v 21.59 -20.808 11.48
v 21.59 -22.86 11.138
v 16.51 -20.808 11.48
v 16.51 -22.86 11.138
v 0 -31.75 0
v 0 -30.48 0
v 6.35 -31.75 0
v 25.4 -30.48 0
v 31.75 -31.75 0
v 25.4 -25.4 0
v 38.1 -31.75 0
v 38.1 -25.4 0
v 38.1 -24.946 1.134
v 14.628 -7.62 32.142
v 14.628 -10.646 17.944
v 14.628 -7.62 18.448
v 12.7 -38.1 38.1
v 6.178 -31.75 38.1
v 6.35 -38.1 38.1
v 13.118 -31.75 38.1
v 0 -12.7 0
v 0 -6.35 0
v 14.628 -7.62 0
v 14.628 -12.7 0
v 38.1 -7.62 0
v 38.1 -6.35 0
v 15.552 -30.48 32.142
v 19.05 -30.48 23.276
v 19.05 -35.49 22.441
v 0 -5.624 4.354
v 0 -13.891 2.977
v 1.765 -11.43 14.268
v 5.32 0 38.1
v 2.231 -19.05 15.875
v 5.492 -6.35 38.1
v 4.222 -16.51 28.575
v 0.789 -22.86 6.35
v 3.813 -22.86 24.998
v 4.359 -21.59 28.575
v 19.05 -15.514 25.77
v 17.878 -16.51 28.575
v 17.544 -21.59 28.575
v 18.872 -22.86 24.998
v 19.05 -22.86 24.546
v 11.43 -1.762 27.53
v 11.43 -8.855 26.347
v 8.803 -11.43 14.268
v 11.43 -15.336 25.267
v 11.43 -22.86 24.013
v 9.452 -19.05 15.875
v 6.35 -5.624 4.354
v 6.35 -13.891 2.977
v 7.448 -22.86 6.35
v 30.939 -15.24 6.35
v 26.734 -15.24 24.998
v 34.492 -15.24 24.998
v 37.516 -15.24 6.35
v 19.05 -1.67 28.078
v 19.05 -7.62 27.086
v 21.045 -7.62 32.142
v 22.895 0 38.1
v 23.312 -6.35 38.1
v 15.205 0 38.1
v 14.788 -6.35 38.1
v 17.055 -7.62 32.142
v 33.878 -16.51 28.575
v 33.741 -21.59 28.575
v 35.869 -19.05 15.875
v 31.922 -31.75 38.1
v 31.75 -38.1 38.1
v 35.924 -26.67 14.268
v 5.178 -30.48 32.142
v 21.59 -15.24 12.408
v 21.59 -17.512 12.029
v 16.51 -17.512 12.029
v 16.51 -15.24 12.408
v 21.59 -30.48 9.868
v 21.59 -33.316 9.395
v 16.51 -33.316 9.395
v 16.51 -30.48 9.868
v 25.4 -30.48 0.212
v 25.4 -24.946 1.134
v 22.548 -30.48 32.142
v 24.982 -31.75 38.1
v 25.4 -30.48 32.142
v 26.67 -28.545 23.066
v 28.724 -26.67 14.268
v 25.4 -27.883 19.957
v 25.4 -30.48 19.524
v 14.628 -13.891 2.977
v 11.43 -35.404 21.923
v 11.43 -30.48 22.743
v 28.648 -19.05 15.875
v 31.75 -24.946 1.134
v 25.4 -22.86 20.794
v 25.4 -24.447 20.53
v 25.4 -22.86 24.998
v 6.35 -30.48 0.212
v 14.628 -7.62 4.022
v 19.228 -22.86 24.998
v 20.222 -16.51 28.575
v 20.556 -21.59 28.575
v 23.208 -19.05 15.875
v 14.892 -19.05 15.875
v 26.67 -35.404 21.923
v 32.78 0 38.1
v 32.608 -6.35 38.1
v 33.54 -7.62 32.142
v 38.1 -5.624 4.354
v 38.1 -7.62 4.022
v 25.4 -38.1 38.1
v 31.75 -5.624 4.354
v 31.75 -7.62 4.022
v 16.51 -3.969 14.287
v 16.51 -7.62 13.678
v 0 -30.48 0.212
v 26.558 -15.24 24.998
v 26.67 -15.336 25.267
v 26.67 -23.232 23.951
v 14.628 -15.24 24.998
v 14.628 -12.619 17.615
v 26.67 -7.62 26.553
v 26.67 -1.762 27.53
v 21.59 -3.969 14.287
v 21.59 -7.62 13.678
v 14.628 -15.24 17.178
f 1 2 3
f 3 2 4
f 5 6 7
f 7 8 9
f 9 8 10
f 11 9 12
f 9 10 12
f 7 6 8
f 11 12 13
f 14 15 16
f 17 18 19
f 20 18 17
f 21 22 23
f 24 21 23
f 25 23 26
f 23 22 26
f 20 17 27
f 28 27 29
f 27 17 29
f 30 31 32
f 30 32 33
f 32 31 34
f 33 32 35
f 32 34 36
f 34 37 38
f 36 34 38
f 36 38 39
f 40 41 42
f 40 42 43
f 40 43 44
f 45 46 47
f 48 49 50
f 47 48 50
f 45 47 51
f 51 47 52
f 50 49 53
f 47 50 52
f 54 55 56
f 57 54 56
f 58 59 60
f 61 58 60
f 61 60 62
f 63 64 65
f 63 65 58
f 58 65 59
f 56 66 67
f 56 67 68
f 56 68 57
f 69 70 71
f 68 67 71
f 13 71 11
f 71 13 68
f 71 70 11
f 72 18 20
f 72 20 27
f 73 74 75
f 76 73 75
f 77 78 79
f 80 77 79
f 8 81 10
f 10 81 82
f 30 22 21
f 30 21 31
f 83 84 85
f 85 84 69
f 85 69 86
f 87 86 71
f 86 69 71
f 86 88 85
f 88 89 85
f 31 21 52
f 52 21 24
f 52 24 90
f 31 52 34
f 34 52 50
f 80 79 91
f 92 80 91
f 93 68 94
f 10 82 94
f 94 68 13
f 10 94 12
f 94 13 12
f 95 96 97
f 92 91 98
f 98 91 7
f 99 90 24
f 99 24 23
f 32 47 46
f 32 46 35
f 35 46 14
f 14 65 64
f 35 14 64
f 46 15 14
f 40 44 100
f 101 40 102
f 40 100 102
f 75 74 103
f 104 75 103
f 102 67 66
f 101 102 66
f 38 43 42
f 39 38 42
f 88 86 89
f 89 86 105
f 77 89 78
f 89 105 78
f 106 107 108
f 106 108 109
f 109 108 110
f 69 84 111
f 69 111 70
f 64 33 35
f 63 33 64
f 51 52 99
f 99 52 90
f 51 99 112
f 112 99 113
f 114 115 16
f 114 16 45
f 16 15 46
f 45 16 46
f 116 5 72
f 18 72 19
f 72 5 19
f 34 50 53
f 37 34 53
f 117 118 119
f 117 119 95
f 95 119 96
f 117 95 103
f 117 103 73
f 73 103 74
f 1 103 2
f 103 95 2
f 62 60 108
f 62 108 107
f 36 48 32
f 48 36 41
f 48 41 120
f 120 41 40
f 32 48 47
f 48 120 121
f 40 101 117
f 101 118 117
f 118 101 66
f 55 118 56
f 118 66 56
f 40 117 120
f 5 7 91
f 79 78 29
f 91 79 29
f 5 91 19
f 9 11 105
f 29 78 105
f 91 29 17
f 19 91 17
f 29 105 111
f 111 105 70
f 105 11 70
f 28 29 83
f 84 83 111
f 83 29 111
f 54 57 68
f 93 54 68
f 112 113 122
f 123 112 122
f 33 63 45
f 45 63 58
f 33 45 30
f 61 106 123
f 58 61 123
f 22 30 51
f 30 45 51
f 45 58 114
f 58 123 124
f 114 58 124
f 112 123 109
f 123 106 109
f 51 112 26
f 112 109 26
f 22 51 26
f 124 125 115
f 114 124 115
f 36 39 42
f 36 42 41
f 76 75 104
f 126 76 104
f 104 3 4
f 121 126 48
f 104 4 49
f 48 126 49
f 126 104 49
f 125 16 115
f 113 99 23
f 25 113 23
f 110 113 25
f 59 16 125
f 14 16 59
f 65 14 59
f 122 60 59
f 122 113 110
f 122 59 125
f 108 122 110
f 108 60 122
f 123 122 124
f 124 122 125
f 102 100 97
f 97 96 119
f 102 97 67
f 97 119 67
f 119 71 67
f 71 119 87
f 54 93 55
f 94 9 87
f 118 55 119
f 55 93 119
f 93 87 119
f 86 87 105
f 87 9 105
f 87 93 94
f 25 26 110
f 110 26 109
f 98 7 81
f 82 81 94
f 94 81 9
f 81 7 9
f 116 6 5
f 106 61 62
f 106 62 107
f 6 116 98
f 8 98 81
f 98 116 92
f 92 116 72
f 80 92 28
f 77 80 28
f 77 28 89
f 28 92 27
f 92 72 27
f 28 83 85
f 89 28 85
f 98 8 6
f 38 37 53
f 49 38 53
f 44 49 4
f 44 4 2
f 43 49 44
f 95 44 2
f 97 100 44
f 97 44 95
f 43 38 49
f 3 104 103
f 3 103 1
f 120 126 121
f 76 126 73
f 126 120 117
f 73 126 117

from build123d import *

# Parameters (mm, degrees)
F0_W     = 38.1
F0_H     = 38.1
F1_DEPTH = 38.1
F4_DEPTH = 38.1
F6_DEPTH = 38.1
F7_W     = 23.472134
F7_H     = 7.62
F7_W_2   = 25.4
F8_DEPTH = 38.1


with BuildPart() as f1:
    # F0 (on Front) → F1 (new body)
    with BuildSketch(Plane.XZ):
        with Locations((19.05, 19.05)):
            Rectangle(F0_W, F0_H)
    extrude(amount=F1_DEPTH)

    # F3 (on face) → F4 (cut)
    with BuildSketch(Plane.YZ.offset(38.1)):
        Polygon((-6.35, 38.1), (-31.75, 38.1), (-26.67, 14.267865), (-21.59, 28.575), (-16.51, 28.575), (-11.43, 14.267865), align=None)
        Polygon((-31.75, 0), (-38.1, 38.1), (-38.1, 0), align=None)
        Polygon((-19.05, 15.875), (-25.4, 0), (-12.7, 0), align=None)
        Polygon((0, 0), (0, 38.1), (-6.35, 0), align=None)
    extrude(amount=-F4_DEPTH, mode=Mode.SUBTRACT)

    # F5 (on face) → F6 (cut)
    with BuildSketch(Plane(origin=(0, -30.891892, -5.148649), x_dir=(1, 0, 0), z_dir=(0, -0.986394, -0.164399))):
        Polygon((11.43, 27.444668), (6.35, 5.219668), (31.75, 5.219668), (26.67, 27.444668), (21.59, 14.744668), (16.51, 14.744668), align=None)
        Polygon((25.4, 43.84521), (12.7, 43.84521), (19.05, 27.97021), align=None)
        Polygon((0, 43.84521), (0, 5.219668), (6.35, 43.84521), align=None)
        Polygon((31.75, 43.84521), (38.1, 5.219668), (38.1, 43.84521), align=None)
    extrude(amount=-F6_DEPTH, mode=Mode.SUBTRACT)

    # F7 (on offset) → F8 (cut)
    with BuildSketch(Plane.XY.offset(38.1)):
        with Locations((26.363933, -11.43)):
            Rectangle(F7_W, F7_H)
        with Locations((12.7, -26.67)):
            Rectangle(F7_W_2, F7_H)
    extrude(amount=-F8_DEPTH, mode=Mode.SUBTRACT)


solid = f1.part
